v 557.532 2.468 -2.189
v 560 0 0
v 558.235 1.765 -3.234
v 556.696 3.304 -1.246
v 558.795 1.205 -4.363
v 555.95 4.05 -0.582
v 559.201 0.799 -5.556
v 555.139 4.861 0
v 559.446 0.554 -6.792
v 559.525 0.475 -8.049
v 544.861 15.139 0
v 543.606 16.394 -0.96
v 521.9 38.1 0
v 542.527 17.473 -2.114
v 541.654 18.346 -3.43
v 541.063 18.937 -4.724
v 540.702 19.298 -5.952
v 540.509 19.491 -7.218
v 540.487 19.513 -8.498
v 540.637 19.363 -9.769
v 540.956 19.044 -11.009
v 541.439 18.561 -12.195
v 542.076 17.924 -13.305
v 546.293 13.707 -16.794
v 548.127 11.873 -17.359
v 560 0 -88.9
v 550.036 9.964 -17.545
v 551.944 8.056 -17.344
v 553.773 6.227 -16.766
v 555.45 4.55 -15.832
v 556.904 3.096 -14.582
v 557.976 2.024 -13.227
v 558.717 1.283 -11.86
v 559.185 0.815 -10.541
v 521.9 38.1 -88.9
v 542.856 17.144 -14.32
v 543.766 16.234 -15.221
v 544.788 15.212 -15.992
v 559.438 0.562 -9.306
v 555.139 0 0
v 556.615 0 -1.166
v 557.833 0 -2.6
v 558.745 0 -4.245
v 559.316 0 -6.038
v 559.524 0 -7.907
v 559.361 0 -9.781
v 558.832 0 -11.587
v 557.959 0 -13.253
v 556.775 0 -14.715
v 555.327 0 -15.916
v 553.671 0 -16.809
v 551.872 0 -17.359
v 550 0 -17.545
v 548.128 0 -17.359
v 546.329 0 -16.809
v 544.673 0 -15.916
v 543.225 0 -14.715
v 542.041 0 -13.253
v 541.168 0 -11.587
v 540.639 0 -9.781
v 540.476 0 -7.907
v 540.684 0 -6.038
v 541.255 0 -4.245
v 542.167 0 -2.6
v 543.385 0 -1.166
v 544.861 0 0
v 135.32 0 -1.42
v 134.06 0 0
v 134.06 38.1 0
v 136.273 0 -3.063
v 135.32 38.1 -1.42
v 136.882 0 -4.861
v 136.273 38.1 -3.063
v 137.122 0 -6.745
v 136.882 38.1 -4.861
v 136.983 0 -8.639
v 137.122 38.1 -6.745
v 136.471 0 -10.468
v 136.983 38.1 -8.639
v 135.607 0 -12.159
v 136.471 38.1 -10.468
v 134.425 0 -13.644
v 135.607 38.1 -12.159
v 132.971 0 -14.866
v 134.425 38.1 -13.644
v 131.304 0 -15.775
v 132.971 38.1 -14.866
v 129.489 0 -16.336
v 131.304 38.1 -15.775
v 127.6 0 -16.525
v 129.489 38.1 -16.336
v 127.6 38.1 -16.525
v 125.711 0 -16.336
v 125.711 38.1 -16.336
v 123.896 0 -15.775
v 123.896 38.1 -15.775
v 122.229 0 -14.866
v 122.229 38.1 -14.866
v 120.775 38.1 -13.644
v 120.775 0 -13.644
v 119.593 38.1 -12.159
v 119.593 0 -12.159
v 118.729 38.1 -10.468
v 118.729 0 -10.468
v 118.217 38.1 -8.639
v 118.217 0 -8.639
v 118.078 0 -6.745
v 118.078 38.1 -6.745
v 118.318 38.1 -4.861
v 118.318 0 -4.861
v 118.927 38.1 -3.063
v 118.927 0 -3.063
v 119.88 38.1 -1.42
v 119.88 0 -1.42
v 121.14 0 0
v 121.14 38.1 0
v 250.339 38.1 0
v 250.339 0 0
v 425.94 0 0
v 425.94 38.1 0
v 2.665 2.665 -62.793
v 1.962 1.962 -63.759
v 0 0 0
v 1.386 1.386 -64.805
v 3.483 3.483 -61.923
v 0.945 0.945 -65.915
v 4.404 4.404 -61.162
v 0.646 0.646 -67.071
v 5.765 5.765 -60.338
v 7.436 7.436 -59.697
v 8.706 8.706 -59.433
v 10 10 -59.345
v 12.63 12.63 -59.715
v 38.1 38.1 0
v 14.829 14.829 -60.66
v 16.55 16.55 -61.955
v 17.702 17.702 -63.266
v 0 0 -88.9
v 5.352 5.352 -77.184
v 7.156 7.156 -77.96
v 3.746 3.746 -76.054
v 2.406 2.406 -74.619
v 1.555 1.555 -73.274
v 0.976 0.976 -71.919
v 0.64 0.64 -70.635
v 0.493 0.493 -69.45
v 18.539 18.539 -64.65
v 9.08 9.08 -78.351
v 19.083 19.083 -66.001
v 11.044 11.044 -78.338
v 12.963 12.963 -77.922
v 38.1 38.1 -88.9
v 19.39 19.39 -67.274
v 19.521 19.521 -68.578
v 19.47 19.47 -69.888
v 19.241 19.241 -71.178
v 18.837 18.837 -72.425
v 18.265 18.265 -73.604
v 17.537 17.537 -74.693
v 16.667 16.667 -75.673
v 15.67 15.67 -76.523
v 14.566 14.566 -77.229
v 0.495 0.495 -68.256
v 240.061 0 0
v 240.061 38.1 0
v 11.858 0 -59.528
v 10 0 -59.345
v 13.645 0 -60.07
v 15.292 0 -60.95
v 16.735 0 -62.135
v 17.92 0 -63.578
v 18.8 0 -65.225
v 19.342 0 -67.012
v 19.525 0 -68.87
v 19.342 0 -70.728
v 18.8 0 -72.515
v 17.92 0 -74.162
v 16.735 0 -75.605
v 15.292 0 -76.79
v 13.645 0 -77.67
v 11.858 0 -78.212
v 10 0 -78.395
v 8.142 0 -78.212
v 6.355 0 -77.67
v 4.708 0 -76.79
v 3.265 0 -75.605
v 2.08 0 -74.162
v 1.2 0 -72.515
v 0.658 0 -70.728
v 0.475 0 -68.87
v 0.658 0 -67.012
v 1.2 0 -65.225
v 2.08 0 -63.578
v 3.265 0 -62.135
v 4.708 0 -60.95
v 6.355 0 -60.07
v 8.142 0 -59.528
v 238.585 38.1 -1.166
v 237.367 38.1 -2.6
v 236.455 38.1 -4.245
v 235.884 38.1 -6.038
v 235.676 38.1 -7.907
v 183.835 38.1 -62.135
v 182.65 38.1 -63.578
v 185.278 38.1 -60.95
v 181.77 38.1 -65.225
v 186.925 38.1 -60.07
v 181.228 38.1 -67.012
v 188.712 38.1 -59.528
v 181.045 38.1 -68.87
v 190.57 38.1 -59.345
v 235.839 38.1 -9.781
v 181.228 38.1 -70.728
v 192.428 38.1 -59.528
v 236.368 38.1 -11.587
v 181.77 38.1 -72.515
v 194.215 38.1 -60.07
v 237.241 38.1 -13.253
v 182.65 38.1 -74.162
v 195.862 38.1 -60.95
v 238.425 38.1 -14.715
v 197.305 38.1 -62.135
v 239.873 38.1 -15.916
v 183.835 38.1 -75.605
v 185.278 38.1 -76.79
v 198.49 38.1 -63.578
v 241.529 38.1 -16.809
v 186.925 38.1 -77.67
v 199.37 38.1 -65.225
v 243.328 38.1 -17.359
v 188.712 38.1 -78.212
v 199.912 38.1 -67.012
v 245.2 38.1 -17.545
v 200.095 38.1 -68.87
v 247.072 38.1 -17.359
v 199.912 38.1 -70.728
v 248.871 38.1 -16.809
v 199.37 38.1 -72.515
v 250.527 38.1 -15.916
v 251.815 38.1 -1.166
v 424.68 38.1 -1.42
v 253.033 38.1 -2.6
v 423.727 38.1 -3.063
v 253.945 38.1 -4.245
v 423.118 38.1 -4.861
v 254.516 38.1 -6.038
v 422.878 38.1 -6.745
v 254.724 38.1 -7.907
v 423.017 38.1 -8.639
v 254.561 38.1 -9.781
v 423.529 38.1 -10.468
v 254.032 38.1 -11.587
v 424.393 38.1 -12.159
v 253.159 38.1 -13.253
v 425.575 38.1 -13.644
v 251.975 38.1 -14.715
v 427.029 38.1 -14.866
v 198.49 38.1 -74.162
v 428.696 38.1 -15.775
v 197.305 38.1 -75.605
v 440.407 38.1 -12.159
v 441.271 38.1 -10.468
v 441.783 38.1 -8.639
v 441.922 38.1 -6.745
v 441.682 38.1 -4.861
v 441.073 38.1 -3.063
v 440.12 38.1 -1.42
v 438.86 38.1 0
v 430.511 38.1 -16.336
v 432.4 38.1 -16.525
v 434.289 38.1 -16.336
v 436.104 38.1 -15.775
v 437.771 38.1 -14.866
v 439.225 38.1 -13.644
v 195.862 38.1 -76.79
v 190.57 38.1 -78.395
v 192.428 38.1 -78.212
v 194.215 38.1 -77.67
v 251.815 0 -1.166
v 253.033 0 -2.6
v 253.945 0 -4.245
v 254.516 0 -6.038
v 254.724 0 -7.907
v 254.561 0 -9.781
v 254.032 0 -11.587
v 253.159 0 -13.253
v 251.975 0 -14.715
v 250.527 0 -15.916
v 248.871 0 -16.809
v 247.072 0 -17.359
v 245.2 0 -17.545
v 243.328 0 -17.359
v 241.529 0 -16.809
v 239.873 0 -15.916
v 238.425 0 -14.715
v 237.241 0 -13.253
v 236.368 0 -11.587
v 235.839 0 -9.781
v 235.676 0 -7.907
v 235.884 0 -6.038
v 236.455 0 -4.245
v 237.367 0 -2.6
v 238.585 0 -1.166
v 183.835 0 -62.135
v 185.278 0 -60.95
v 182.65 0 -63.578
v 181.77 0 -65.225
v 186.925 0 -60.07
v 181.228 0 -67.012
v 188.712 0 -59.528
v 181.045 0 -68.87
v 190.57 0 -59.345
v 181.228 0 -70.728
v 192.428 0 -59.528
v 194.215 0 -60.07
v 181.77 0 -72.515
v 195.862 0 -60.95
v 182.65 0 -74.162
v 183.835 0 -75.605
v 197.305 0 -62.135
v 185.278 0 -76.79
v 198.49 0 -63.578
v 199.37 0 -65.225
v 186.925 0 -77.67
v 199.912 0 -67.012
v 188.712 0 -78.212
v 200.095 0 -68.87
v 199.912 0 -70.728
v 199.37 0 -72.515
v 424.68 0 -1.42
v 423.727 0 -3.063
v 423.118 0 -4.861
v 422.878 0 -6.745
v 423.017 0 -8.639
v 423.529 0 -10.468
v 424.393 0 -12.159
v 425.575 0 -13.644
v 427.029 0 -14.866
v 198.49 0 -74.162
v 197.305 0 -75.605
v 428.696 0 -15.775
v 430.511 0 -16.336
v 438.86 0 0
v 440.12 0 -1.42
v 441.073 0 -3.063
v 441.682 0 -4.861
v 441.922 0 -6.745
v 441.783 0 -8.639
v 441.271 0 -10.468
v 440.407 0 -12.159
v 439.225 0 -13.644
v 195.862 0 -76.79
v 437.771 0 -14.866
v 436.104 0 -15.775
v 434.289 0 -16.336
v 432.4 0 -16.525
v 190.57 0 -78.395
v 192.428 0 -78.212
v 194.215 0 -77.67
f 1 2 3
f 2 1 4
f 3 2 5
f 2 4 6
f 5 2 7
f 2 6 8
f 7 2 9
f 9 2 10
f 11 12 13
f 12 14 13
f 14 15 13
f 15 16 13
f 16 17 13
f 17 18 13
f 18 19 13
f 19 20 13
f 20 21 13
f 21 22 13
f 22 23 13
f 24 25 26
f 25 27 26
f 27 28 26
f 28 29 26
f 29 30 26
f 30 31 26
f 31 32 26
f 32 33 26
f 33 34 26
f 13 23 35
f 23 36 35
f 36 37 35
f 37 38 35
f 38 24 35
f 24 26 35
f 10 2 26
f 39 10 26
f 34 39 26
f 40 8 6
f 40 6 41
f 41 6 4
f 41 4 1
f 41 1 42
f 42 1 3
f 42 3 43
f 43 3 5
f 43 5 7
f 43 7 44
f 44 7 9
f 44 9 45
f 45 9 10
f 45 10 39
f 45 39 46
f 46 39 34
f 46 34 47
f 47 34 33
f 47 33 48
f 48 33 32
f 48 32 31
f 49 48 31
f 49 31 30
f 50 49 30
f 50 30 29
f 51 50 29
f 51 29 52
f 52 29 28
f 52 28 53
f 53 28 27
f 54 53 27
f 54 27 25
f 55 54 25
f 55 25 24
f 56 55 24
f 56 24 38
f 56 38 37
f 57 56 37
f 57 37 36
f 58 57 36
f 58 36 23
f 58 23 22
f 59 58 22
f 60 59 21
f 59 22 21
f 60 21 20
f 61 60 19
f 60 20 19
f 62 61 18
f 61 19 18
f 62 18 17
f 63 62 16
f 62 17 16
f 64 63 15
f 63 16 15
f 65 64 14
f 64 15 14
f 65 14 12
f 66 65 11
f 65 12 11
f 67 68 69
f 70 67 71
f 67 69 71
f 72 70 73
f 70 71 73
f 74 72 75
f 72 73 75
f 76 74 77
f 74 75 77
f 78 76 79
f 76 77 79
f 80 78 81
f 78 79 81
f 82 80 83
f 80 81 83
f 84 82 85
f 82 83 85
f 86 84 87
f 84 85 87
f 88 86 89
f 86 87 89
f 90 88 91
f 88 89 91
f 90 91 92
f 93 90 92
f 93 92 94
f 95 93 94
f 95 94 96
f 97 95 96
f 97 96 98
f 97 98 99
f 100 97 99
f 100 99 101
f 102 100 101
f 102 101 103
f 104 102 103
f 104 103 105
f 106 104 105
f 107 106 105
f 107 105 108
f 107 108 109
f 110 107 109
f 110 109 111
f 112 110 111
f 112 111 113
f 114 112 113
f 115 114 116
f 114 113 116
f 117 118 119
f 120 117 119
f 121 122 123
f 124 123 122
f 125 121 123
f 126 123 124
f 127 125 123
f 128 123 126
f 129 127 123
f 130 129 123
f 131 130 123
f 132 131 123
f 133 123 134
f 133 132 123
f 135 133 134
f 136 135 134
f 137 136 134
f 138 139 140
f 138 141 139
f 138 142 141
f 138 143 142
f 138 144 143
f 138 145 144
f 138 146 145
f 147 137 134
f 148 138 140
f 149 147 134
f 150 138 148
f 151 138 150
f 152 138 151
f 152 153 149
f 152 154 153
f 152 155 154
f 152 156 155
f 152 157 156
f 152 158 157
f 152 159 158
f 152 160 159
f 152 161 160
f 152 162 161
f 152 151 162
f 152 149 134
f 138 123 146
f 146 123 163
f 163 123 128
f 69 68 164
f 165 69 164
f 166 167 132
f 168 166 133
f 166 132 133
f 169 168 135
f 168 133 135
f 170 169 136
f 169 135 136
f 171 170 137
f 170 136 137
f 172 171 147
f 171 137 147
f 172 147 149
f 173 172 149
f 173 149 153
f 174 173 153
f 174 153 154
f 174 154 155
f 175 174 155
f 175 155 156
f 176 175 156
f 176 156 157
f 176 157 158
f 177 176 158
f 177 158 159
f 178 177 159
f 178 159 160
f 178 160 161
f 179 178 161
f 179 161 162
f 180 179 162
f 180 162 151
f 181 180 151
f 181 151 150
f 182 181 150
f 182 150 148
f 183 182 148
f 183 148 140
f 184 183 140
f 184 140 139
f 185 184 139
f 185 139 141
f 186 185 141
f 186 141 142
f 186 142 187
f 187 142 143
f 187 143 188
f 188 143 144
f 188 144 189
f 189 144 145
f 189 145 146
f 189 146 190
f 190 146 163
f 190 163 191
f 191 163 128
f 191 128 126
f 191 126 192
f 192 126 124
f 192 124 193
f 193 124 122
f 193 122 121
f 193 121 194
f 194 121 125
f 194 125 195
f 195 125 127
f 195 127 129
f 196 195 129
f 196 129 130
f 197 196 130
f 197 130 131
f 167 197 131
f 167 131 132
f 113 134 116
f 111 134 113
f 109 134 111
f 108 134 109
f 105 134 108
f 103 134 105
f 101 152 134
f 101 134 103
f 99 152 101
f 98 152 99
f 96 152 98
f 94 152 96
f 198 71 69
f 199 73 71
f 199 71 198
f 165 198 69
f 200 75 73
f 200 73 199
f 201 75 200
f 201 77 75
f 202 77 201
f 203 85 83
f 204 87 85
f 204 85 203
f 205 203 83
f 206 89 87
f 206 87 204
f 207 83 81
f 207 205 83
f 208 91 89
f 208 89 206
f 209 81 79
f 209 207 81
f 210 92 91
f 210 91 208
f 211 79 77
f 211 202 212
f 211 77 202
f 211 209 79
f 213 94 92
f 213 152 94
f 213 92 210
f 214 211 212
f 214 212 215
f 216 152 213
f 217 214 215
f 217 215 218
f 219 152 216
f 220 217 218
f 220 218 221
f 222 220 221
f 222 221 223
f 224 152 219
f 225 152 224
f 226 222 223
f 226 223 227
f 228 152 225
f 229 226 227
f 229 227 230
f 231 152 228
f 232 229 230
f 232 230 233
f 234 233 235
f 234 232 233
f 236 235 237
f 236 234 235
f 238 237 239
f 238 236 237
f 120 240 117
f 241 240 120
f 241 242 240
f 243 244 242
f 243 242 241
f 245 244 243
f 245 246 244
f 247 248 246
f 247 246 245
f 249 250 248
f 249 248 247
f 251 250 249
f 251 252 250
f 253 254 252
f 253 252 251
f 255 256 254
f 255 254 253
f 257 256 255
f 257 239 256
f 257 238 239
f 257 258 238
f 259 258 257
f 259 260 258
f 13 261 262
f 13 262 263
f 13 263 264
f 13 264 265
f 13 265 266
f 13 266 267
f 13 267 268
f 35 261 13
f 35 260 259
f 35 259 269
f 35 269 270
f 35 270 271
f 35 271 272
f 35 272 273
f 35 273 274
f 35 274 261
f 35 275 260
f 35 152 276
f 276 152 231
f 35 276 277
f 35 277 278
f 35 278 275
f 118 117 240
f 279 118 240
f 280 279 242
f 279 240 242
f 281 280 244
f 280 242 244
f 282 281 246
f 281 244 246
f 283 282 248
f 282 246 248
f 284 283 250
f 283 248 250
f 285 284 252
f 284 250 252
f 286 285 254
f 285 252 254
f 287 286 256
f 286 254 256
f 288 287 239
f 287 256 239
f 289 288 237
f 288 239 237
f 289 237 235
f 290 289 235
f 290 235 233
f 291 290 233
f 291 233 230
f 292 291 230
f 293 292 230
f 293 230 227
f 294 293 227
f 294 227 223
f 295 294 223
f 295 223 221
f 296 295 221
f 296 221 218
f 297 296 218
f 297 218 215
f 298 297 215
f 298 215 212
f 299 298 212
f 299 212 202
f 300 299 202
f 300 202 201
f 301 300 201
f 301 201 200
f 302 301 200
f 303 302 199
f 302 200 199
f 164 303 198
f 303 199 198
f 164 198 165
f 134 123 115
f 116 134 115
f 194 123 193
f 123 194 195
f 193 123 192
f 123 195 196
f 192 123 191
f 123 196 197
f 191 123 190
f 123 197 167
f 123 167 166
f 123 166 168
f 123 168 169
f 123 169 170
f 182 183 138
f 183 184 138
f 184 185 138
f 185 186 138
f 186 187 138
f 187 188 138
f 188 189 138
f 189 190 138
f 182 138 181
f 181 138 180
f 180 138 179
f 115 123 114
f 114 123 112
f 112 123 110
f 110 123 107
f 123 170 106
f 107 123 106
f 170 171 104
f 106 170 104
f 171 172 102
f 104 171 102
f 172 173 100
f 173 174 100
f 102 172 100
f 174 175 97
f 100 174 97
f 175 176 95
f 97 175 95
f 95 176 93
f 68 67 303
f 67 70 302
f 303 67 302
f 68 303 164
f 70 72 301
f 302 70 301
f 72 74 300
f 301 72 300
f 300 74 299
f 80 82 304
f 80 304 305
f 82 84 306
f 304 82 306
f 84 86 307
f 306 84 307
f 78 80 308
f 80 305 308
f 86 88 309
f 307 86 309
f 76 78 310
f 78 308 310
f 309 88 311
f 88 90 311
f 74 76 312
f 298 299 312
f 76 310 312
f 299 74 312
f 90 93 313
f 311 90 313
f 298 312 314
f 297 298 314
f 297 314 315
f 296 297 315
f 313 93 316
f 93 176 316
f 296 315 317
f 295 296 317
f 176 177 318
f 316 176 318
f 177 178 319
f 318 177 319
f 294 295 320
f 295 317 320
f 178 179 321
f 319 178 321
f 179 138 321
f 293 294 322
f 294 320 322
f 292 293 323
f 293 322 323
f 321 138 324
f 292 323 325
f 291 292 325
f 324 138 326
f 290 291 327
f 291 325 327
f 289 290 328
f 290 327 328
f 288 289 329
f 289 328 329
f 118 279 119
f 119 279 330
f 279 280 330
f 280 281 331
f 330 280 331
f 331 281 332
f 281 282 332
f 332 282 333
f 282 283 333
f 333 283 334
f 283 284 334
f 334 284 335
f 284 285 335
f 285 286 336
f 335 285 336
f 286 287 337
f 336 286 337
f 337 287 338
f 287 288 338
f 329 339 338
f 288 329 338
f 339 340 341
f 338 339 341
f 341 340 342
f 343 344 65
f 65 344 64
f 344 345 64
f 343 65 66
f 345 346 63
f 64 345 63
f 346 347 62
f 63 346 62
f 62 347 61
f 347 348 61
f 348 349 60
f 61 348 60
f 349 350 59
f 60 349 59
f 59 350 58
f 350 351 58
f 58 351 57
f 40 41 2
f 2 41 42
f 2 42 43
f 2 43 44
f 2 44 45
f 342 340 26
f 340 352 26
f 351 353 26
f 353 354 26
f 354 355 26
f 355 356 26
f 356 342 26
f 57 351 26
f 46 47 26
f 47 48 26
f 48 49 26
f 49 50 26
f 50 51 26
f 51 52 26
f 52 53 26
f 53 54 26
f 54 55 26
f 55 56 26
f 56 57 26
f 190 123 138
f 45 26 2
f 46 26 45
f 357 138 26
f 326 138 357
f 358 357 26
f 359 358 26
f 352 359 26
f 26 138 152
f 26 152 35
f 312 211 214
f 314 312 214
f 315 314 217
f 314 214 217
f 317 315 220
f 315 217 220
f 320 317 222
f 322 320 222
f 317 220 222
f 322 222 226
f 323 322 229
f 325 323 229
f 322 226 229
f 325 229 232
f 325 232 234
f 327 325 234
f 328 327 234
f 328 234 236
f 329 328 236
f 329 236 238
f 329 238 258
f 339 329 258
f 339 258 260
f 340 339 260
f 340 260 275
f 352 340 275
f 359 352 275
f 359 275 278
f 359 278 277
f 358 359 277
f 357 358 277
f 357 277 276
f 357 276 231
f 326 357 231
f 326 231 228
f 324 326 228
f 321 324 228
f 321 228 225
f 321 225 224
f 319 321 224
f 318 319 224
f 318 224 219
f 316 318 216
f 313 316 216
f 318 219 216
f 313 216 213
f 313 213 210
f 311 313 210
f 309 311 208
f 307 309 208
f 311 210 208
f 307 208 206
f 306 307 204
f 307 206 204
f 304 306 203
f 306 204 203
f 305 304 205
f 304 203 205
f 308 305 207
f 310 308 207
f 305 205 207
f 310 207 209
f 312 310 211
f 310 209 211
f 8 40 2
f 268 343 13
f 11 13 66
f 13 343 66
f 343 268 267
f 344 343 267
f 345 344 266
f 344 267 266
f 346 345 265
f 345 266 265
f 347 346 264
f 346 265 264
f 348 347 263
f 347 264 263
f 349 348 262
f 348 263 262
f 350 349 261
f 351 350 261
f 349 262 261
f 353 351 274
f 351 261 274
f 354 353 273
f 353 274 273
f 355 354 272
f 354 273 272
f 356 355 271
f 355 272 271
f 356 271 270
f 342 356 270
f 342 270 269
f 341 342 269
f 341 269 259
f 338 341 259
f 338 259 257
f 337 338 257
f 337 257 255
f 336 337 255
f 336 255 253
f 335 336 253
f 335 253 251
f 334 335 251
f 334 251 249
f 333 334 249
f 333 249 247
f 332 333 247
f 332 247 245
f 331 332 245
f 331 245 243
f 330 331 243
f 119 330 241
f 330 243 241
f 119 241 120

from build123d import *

# Parameters (mm, degrees)
SKETCH1_W                   = 560
SKETCH1_H                   = 88.9
BODY_DEPTH                  = 38.1
MOUNTING_HOLE_SPACING_REACH = 570.291
SKETCH2_R                   = 9.525
CUT_EXTRUDE1_REACH          = 570.291


with BuildPart() as part:
    # Sketch1 → Body (new body)
    with BuildSketch(Plane(origin=(0, 0, 0), x_dir=(1, 0, 0), z_dir=(0, 1, 0))):
        with Locations((280, 44.45)):
            Rectangle(SKETCH1_W, SKETCH1_H)
    extrude(amount=BODY_DEPTH)

    # Sketch2 → Mounting hole spacing (cut, up to next)
    with BuildSketch(Plane(origin=(0, 38.1, 0), x_dir=(1, 0, 0), z_dir=(0, 1, 0)), mode=Mode.PRIVATE) as mounting_hole_spacing_sk1:
        with Locations((127.6, 7)):
            Circle(SKETCH2_R)
    mounting_hole_spacing_tool1 = extrude(mounting_hole_spacing_sk1.sketch, amount=-MOUNTING_HOLE_SPACING_REACH, mode=Mode.PRIVATE) & part.part
    # Sketch2 → Mounting hole spacing (cut, up to next)
    with BuildSketch(Plane(origin=(0, 38.1, 0), x_dir=(1, 0, 0), z_dir=(0, 1, 0)), mode=Mode.PRIVATE) as mounting_hole_spacing_sk2:
        with Locations(Location((190.57, 68.87, 0), (0, 0, 270))):
            Circle(SKETCH2_R)
    mounting_hole_spacing_tool2 = extrude(mounting_hole_spacing_sk2.sketch, amount=-MOUNTING_HOLE_SPACING_REACH, mode=Mode.PRIVATE) & part.part
    # Sketch2 → Mounting hole spacing (cut, up to next)
    with BuildSketch(Plane(origin=(0, 38.1, 0), x_dir=(1, 0, 0), z_dir=(0, 1, 0)), mode=Mode.PRIVATE) as mounting_hole_spacing_sk3:
        with Locations(Location((10, 68.87, 0), (0, 0, 270))):
            Circle(SKETCH2_R)
    mounting_hole_spacing_tool3 = extrude(mounting_hole_spacing_sk3.sketch, amount=-MOUNTING_HOLE_SPACING_REACH, mode=Mode.PRIVATE) & part.part
    # Sketch2 → Mounting hole spacing (cut, up to next)
    with BuildSketch(Plane(origin=(0, 38.1, 0), x_dir=(1, 0, 0), z_dir=(0, 1, 0)), mode=Mode.PRIVATE) as mounting_hole_spacing_sk4:
        with Locations((245.2, 8.02)):
            Circle(SKETCH2_R)
    mounting_hole_spacing_tool4 = extrude(mounting_hole_spacing_sk4.sketch, amount=-MOUNTING_HOLE_SPACING_REACH, mode=Mode.PRIVATE) & part.part
    # Sketch2 → Mounting hole spacing (cut, up to next)
    with BuildSketch(Plane(origin=(0, 38.1, 0), x_dir=(1, 0, 0), z_dir=(0, 1, 0)), mode=Mode.PRIVATE) as mounting_hole_spacing_sk5:
        with Locations((550, 8.02)):
            Circle(SKETCH2_R)
    mounting_hole_spacing_tool5 = extrude(mounting_hole_spacing_sk5.sketch, amount=-MOUNTING_HOLE_SPACING_REACH, mode=Mode.PRIVATE) & part.part
    # Sketch2 → Mounting hole spacing (cut, up to next)
    with BuildSketch(Plane(origin=(0, 38.1, 0), x_dir=(1, 0, 0), z_dir=(0, 1, 0)), mode=Mode.PRIVATE) as mounting_hole_spacing_sk6:
        with Locations((432.4, 7)):
            Circle(SKETCH2_R)
    mounting_hole_spacing_tool6 = extrude(mounting_hole_spacing_sk6.sketch, amount=-MOUNTING_HOLE_SPACING_REACH, mode=Mode.PRIVATE) & part.part
    add(mounting_hole_spacing_tool1.solids().sort_by_distance((127.6, 38.1, -7))[0], mode=Mode.SUBTRACT)
    add(mounting_hole_spacing_tool2.solids().sort_by_distance((190.57, 38.1, -68.87))[0], mode=Mode.SUBTRACT)
    add(mounting_hole_spacing_tool3.solids().sort_by_distance((10, 38.1, -68.87))[0], mode=Mode.SUBTRACT)
    add(mounting_hole_spacing_tool4.solids().sort_by_distance((245.2, 38.1, -8.02))[0], mode=Mode.SUBTRACT)
    add(mounting_hole_spacing_tool5.solids().sort_by_distance((550, 38.1, -8.02))[0], mode=Mode.SUBTRACT)
    add(mounting_hole_spacing_tool6.solids().sort_by_distance((432.4, 38.1, -7))[0], mode=Mode.SUBTRACT)

    # Sketch3 → Cut-Extrude1 (cut, up to next)
    with BuildSketch(Plane(origin=(0, 0, -88.9), x_dir=(-1, 0, 0), z_dir=(0, 0, -1)), mode=Mode.PRIVATE) as cut_extrude1_sk1:
        Polygon((-560, 0), (-521.9, 38.1), (-560, 38.1), align=None)
    cut_extrude1_tool1 = extrude(cut_extrude1_sk1.sketch, amount=-CUT_EXTRUDE1_REACH, mode=Mode.PRIVATE) & part.part
    # Sketch3 → Cut-Extrude1 (cut, up to next)
    with BuildSketch(Plane(origin=(0, 0, -88.9), x_dir=(-1, 0, 0), z_dir=(0, 0, -1)), mode=Mode.PRIVATE) as cut_extrude1_sk2:
        Polygon((0, 38.1), (0, 0), (-38.1, 38.1), align=None)
    cut_extrude1_tool2 = extrude(cut_extrude1_sk2.sketch, amount=-CUT_EXTRUDE1_REACH, mode=Mode.PRIVATE) & part.part
    add(cut_extrude1_tool1.solids().sort_by_distance((547.3, 25.4, -88.9))[0], mode=Mode.SUBTRACT)
    add(cut_extrude1_tool2.solids().sort_by_distance((12.7, 25.4, -88.9))[0], mode=Mode.SUBTRACT)


solid = part.part
